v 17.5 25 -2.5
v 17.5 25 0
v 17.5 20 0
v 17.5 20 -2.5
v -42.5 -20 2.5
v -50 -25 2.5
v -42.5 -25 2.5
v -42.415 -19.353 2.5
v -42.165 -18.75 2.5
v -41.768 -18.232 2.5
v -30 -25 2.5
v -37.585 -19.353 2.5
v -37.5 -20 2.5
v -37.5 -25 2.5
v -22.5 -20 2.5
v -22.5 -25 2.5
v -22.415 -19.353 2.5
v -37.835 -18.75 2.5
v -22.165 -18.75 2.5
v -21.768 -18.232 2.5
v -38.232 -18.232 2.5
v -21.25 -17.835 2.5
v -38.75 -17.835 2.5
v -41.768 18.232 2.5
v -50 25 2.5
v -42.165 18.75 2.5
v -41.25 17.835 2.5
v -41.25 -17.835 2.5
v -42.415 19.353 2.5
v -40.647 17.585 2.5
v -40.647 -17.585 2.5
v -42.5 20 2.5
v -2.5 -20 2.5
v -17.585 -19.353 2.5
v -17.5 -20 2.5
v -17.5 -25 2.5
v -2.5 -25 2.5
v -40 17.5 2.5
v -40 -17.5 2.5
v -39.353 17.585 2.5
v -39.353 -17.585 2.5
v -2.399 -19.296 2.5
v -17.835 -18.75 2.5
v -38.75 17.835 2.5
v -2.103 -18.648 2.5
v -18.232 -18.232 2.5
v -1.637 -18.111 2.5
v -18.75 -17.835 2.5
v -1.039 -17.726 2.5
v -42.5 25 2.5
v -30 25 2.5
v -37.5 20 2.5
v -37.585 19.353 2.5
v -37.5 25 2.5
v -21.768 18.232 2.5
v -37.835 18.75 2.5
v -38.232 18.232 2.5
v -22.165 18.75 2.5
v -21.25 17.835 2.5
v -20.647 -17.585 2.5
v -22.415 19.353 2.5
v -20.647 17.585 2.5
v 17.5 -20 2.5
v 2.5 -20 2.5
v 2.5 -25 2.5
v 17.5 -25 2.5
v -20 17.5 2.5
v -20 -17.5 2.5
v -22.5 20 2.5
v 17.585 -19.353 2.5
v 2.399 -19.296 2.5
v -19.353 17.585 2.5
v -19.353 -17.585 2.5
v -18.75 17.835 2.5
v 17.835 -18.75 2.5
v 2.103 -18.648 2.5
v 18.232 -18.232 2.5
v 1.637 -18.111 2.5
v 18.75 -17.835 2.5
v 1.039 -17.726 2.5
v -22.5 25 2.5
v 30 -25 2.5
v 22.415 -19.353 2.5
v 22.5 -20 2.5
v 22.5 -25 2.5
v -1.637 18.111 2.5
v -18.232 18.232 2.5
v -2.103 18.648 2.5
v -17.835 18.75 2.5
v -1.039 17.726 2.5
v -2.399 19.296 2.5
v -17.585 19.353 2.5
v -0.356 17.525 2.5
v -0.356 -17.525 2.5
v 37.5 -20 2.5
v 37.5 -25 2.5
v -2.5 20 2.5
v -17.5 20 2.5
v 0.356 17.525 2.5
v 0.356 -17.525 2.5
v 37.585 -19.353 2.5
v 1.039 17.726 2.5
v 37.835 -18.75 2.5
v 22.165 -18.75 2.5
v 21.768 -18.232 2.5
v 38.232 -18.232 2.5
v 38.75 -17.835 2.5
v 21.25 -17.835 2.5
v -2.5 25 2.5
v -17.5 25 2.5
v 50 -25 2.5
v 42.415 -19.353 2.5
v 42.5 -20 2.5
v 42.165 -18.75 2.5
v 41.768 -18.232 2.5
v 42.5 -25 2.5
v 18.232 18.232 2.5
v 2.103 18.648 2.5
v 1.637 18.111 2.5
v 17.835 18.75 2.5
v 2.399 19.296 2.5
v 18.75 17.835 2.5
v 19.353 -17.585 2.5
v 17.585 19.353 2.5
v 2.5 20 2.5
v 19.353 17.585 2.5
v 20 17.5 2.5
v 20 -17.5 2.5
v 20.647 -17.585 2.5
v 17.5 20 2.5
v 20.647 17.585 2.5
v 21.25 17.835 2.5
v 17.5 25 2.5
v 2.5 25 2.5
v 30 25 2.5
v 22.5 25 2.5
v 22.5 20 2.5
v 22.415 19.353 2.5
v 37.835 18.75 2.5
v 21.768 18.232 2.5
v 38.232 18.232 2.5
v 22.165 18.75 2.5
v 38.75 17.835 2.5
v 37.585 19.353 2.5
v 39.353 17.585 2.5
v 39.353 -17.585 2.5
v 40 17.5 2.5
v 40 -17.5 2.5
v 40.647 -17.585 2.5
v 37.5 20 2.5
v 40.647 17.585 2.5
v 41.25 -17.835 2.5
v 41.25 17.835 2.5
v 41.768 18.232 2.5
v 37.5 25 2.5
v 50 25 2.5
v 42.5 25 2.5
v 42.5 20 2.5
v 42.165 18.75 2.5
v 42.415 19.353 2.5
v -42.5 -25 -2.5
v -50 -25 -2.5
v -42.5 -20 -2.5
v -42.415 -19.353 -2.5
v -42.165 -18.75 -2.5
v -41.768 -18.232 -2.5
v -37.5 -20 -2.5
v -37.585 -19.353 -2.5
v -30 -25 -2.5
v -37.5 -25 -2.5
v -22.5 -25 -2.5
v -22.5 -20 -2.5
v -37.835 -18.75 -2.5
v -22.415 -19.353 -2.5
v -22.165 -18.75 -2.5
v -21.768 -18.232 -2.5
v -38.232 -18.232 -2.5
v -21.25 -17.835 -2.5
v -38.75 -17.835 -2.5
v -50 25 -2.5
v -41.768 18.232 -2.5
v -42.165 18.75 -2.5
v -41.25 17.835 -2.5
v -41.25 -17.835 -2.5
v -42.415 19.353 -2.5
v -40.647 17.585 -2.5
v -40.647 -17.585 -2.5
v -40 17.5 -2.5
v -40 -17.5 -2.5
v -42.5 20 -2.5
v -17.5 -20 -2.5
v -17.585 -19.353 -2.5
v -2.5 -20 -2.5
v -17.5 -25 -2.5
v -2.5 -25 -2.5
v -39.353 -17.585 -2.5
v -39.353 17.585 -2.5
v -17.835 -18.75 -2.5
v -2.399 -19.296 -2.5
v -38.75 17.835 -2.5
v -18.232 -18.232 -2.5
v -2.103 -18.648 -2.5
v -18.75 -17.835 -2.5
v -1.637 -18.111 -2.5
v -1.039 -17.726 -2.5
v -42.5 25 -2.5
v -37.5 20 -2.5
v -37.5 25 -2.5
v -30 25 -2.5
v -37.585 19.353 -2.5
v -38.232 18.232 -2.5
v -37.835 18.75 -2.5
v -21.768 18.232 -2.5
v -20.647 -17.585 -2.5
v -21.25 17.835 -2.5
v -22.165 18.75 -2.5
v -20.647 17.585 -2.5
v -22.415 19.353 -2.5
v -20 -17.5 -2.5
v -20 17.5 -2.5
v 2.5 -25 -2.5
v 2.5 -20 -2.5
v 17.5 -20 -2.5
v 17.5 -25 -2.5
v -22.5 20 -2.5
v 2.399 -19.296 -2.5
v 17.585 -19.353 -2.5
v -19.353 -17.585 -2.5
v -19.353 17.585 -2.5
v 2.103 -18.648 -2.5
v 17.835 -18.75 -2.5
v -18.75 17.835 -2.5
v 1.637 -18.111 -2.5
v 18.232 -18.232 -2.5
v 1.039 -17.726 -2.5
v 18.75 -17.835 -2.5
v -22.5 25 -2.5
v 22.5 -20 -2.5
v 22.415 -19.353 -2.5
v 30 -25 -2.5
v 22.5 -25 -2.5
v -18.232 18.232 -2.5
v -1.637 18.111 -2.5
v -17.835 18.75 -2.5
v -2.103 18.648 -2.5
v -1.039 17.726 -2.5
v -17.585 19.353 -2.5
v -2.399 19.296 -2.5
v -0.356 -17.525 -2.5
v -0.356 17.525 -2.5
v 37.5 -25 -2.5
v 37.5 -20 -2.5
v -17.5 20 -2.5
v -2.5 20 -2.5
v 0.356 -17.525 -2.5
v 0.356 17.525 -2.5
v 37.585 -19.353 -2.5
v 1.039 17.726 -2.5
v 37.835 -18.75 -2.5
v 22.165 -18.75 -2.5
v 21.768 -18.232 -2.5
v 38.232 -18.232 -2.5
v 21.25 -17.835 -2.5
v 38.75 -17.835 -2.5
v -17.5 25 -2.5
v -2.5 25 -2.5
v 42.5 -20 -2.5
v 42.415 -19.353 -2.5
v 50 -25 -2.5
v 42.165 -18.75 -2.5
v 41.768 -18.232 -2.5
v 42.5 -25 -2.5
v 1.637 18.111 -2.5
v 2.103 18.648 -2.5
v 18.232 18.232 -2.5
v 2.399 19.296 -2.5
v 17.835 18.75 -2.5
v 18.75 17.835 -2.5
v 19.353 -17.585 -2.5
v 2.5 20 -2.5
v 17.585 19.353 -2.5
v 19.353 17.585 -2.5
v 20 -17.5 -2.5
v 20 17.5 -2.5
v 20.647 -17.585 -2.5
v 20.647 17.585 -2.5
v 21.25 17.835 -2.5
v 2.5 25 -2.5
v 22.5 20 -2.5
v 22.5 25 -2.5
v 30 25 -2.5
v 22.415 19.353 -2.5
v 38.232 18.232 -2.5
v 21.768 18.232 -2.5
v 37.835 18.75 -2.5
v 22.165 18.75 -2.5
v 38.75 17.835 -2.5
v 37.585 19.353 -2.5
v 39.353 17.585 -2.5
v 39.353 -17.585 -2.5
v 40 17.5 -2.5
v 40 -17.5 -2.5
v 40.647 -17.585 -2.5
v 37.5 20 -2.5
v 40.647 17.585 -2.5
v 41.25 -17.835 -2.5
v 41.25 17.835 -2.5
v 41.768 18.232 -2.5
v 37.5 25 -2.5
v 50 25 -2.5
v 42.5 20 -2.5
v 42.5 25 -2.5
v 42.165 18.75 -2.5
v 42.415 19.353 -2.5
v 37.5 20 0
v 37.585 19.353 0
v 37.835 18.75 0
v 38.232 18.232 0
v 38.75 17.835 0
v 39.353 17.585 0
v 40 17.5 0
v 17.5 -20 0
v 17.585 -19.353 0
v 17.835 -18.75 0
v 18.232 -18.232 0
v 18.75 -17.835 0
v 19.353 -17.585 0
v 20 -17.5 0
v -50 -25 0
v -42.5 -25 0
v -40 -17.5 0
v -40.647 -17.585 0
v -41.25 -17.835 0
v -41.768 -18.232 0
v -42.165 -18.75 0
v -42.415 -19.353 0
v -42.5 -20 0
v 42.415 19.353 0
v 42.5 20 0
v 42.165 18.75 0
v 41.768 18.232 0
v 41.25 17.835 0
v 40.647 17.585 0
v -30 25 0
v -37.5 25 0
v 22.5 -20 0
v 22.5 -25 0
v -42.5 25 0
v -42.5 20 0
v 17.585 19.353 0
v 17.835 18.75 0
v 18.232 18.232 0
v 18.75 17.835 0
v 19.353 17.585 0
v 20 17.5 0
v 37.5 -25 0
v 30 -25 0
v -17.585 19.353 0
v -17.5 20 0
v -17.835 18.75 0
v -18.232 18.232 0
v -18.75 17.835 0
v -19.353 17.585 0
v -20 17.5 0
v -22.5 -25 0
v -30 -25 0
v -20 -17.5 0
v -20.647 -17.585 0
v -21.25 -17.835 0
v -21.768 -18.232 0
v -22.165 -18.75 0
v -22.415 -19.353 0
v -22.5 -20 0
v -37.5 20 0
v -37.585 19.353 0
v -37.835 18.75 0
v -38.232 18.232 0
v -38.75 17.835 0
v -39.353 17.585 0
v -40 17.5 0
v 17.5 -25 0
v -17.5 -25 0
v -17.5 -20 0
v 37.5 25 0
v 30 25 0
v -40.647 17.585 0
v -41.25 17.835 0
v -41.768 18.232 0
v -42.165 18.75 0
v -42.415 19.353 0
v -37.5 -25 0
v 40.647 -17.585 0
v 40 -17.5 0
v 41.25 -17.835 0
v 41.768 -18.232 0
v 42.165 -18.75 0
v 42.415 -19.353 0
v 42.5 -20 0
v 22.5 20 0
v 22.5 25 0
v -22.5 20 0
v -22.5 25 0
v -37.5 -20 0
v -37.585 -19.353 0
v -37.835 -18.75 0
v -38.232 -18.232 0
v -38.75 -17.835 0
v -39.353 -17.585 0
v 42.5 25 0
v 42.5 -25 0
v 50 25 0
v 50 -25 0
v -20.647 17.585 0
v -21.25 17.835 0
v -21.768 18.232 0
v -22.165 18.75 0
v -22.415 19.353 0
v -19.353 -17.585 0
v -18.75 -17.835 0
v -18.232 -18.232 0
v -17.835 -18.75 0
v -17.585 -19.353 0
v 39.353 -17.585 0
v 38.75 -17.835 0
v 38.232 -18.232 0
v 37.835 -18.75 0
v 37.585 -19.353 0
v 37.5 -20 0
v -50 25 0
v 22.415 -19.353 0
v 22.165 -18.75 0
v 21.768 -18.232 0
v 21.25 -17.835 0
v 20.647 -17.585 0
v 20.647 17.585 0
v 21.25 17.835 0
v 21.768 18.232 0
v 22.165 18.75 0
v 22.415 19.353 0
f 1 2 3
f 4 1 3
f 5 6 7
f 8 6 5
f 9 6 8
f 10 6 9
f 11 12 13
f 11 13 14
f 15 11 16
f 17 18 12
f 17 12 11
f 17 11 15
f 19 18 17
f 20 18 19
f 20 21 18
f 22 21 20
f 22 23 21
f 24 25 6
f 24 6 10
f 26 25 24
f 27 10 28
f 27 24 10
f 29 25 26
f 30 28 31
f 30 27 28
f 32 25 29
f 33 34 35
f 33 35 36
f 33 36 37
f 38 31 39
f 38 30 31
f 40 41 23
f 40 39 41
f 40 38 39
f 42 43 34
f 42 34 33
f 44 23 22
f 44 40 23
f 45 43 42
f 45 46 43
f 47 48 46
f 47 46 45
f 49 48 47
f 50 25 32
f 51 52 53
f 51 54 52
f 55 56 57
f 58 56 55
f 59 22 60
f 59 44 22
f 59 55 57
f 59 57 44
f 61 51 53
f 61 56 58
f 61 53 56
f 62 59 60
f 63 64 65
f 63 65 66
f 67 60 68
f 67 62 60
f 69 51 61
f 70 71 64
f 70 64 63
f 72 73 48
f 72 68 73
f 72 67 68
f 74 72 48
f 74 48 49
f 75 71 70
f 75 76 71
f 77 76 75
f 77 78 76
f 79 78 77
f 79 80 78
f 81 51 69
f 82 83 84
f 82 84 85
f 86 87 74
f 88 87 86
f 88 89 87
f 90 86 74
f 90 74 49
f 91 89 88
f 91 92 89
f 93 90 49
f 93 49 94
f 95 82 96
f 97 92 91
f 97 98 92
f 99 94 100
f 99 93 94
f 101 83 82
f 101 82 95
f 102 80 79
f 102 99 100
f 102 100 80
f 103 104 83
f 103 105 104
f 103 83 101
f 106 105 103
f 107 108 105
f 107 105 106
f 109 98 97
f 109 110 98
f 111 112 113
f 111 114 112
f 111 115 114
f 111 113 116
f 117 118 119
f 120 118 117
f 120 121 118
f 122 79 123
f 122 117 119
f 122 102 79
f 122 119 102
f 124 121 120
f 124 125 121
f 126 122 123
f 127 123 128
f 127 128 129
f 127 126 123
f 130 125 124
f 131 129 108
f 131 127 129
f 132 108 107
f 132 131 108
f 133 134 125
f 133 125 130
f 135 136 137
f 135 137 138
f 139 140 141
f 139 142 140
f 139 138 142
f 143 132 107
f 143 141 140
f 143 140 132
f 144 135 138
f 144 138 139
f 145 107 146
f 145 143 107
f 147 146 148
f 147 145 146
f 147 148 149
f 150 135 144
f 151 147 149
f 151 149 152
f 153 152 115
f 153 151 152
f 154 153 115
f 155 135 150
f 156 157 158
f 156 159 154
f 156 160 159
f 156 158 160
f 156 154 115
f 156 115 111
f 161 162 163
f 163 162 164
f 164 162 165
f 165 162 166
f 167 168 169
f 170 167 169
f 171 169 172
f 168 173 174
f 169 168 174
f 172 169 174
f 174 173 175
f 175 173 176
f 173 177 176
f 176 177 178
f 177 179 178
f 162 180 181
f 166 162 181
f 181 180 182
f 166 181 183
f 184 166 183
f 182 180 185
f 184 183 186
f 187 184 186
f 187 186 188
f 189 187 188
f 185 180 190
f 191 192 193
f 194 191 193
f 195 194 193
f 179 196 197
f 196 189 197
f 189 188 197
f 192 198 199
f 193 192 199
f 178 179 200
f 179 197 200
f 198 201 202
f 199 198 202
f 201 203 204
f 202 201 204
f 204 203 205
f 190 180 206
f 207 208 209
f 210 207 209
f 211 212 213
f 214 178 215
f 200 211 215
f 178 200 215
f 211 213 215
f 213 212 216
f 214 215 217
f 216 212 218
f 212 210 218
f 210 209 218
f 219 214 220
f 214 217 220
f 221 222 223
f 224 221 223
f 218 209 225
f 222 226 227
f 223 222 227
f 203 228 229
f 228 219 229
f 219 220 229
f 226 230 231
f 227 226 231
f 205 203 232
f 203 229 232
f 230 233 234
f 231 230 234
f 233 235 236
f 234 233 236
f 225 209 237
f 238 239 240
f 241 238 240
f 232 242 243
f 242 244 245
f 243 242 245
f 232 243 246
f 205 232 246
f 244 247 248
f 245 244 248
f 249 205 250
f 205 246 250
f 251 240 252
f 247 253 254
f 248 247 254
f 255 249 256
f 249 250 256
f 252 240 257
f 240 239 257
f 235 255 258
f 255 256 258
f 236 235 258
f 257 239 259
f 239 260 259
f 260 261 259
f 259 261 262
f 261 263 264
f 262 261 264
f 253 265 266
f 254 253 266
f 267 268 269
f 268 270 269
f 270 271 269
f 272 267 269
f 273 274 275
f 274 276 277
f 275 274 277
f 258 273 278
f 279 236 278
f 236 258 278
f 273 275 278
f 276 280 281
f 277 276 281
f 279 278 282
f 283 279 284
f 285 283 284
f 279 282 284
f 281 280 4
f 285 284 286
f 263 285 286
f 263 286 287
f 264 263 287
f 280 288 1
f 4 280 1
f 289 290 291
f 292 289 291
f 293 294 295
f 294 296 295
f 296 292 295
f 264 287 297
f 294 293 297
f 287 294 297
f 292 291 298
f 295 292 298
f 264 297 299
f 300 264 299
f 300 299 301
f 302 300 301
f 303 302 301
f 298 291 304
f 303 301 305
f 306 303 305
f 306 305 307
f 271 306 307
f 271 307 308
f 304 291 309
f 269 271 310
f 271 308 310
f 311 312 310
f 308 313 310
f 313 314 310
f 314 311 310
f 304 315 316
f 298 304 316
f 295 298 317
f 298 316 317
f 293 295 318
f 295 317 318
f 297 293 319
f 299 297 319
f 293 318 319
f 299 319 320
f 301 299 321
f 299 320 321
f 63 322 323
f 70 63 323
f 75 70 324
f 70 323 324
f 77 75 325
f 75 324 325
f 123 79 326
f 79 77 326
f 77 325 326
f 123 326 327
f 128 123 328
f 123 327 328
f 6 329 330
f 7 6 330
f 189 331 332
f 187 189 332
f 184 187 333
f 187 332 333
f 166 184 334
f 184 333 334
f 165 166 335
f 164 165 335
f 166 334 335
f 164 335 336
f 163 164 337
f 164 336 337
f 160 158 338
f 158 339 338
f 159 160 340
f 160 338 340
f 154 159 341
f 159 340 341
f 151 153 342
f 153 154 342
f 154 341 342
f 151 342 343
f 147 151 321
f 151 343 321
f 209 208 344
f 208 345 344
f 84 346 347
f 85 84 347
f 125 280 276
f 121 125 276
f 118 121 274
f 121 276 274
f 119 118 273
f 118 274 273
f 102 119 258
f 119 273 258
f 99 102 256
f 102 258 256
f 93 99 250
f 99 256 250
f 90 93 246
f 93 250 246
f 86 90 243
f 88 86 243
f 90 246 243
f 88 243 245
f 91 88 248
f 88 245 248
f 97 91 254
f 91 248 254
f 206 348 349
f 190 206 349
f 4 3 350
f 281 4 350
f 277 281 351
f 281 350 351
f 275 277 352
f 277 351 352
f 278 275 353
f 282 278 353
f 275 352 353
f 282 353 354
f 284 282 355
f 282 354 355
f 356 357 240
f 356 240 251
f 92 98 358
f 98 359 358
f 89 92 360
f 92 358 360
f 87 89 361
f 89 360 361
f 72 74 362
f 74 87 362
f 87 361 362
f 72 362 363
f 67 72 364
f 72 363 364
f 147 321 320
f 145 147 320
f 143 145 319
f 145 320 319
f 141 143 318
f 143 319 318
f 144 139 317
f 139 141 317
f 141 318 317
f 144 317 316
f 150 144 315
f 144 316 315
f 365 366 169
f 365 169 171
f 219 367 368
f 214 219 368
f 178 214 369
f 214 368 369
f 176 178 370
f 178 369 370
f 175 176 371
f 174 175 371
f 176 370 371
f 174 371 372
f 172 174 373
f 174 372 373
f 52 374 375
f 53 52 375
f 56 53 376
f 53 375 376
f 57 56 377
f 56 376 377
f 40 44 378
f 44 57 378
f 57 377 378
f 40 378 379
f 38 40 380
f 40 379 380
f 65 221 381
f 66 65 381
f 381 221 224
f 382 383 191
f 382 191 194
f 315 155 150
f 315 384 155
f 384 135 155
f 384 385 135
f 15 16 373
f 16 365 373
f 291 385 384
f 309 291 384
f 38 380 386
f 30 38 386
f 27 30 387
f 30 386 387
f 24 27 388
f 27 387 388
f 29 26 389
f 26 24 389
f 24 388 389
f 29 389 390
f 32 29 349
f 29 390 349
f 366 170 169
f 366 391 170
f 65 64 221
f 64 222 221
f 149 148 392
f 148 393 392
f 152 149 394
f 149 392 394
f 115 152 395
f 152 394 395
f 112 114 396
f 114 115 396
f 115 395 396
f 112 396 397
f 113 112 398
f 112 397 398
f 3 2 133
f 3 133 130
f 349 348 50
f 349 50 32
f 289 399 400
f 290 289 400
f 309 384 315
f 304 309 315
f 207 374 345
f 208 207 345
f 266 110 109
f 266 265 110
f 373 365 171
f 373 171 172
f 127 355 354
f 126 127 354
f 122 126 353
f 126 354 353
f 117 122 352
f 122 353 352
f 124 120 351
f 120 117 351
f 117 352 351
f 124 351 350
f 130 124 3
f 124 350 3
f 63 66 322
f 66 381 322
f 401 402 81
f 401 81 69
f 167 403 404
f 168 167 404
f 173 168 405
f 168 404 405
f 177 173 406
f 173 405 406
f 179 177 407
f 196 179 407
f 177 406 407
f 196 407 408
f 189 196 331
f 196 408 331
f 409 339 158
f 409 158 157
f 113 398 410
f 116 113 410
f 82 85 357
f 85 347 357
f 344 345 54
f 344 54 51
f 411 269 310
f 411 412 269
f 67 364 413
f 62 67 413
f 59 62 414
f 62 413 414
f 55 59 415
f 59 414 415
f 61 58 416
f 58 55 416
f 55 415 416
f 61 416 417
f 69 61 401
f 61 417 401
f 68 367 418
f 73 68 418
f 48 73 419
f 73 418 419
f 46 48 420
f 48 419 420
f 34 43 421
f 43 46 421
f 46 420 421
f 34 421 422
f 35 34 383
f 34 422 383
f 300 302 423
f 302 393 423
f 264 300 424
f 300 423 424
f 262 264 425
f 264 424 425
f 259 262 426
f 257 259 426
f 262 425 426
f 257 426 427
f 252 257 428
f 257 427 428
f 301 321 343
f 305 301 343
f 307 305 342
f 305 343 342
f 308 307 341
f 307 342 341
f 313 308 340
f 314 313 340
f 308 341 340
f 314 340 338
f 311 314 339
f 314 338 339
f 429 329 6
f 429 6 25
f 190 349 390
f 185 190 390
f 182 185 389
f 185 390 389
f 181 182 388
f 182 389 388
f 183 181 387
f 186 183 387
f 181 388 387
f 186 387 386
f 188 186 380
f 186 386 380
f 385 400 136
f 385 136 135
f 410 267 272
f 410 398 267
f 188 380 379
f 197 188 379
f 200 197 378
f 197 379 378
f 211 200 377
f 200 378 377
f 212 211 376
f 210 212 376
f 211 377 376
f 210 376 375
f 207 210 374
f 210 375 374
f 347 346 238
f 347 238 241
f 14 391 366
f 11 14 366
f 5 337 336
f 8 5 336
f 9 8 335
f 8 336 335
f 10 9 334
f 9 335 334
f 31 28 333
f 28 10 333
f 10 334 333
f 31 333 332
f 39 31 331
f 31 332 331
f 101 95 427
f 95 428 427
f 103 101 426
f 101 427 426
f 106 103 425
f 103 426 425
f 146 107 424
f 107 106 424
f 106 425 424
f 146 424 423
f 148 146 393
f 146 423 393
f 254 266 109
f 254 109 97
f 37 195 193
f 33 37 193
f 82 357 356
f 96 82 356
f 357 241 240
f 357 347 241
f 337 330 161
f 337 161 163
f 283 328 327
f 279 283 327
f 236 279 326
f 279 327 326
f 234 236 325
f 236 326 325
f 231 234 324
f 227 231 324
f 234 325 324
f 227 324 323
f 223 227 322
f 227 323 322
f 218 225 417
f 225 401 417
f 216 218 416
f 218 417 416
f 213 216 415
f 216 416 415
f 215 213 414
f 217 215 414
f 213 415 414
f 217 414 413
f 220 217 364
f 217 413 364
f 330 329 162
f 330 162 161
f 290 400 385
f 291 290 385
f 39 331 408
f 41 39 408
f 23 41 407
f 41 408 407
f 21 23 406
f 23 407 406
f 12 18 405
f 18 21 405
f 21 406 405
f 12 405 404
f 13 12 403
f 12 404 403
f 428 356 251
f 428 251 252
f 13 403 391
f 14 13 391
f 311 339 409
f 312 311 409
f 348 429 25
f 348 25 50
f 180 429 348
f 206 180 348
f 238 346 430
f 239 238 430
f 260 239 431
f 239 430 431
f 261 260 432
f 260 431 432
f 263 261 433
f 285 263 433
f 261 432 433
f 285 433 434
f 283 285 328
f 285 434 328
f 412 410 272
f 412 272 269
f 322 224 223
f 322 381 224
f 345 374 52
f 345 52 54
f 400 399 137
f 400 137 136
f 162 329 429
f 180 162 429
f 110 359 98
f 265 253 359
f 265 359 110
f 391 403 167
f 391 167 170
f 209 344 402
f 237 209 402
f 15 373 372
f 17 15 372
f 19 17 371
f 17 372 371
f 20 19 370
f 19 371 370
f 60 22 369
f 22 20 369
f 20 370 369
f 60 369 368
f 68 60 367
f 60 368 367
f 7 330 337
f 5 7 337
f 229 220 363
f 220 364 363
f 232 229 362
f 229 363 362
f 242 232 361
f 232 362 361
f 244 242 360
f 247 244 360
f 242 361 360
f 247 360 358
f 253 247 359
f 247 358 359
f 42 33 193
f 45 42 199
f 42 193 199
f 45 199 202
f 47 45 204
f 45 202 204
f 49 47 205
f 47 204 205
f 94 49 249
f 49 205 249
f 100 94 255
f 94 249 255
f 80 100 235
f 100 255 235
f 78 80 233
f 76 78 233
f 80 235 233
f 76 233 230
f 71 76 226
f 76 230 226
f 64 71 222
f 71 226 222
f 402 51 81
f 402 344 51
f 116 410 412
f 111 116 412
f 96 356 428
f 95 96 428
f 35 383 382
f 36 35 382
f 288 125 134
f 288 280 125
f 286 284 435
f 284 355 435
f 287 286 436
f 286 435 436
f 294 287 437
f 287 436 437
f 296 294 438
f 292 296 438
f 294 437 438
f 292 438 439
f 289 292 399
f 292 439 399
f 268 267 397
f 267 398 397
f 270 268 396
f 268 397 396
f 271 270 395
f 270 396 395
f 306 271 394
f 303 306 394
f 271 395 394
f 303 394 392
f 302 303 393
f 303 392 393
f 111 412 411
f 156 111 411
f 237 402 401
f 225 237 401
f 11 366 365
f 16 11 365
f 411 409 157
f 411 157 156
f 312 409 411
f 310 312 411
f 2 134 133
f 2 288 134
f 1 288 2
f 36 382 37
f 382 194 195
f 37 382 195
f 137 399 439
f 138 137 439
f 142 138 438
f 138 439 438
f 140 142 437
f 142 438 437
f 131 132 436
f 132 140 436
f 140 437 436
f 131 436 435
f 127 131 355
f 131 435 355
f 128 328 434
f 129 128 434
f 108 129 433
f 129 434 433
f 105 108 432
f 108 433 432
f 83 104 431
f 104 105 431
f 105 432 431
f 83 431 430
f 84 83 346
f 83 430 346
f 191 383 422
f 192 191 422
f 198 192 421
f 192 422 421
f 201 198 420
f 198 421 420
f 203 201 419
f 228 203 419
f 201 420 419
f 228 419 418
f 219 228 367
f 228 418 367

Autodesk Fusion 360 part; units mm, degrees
sketch "Sketch1" plane through (0, 0, 0) normal (0, 0, 1) x (1, 0, 0)
  line L0 (-10, 25) -> (-2.5, 25)
  line L1 (-2.5, 25) -> (-2.5, 20)
  arc A0 (-2.5, 20) -> (0, 17.5) centre (0, 20) ccw
  arc A1 (0, 17.5) -> (2.5, 20) centre (0, 20) ccw
  line L2 (2.5, 20) -> (2.5, 25)
  line L3 (2.5, 25) -> (10, 25)
  line L4 (0, 0) -> (0, 20) construction
  line L5 (0, 0) -> (10, 0) construction
  line L6 (-10, -25) -> (-2.5, -25)
  line L7 (-2.5, -25) -> (-2.5, -20)
  arc A2 (0, -17.5) -> (-2.5, -20) centre (0, -20) ccw
  arc A3 (2.5, -20) -> (0, -17.5) centre (0, -20) ccw
  line L8 (2.5, -20) -> (2.5, -25)
  line L9 (2.5, -25) -> (10, -25)
  line L10 (10, -25) -> (10, 25)
  line L11 (-10, -25) -> (-10, 25)
  line L12 (-10, 17.5) -> (10, 17.5) construction
  line L13 (-37.5, 25) -> (-30, 25)
  line L14 (-37.5, 20) -> (-37.5, 25)
  arc A4 (-40, 17.5) -> (-37.5, 20) centre (-40, 20) ccw
  arc A5 (-42.5, 20) -> (-40, 17.5) centre (-40, 20) ccw
  line L15 (-42.5, 25) -> (-42.5, 20)
  line L16 (-50, 25) -> (-42.5, 25)
  line L17 (-50, -25) -> (-50, 25)
  line L18 (-50, -25) -> (-42.5, -25)
  line L19 (-42.5, -25) -> (-42.5, -20)
  arc A6 (-40, -17.5) -> (-42.5, -20) centre (-40, -20) ccw
  arc A7 (-37.5, -20) -> (-40, -17.5) centre (-40, -20) ccw
  line L20 (-37.5, -20) -> (-37.5, -25)
  line L21 (-37.5, -25) -> (-30, -25)
  line L22 (-30, -25) -> (-30, 25)
  line L23 (-17.5, 25) -> (-10, 25)
  line L24 (-17.5, 20) -> (-17.5, 25)
  arc A8 (-20, 17.5) -> (-17.5, 20) centre (-20, 20) ccw
  arc A9 (-22.5, 20) -> (-20, 17.5) centre (-20, 20) ccw
  line L25 (-22.5, 25) -> (-22.5, 20)
  line L26 (-30, 25) -> (-22.5, 25)
  line L27 (-30, -25) -> (-30, 25)
  line L28 (-30, -25) -> (-22.5, -25)
  line L29 (-22.5, -25) -> (-22.5, -20)
  arc A10 (-20, -17.5) -> (-22.5, -20) centre (-20, -20) ccw
  arc A11 (-17.5, -20) -> (-20, -17.5) centre (-20, -20) ccw
  line L30 (-17.5, -20) -> (-17.5, -25)
  line L31 (-17.5, -25) -> (-10, -25)
  line L32 (-10, -25) -> (-10, 25)
  line L33 (22.5, 25) -> (30, 25)
  line L34 (22.5, 20) -> (22.5, 25)
  arc A12 (20, 17.5) -> (22.5, 20) centre (20, 20) ccw
  arc A13 (17.5, 20) -> (20, 17.5) centre (20, 20) ccw
  line L35 (17.5, 25) -> (17.5, 20)
  line L36 (10, 25) -> (17.5, 25)
  line L37 (10, -25) -> (10, 25)
  line L38 (10, -25) -> (17.5, -25)
  line L39 (17.5, -25) -> (17.5, -20)
  arc A14 (20, -17.5) -> (17.5, -20) centre (20, -20) ccw
  arc A15 (22.5, -20) -> (20, -17.5) centre (20, -20) ccw
  line L40 (22.5, -20) -> (22.5, -25)
  line L41 (22.5, -25) -> (30, -25)
  line L42 (30, -25) -> (30, 25)
  line L43 (42.5, 25) -> (50, 25)
  line L44 (42.5, 20) -> (42.5, 25)
  arc A16 (40, 17.5) -> (42.5, 20) centre (40, 20) ccw
  arc A17 (37.5, 20) -> (40, 17.5) centre (40, 20) ccw
  line L45 (37.5, 25) -> (37.5, 20)
  line L46 (30, 25) -> (37.5, 25)
  line L47 (30, -25) -> (30, 25)
  line L48 (30, -25) -> (37.5, -25)
  line L49 (37.5, -25) -> (37.5, -20)
  arc A18 (40, -17.5) -> (37.5, -20) centre (40, -20) ccw
  arc A19 (42.5, -20) -> (40, -17.5) centre (40, -20) ccw
  line L50 (42.5, -20) -> (42.5, -25)
  line L51 (42.5, -25) -> (50, -25)
  line L52 (50, -25) -> (50, 25)
  dimension "Notch_Radius" = 2.5
  dimension "Notch_Height" = 7.5
  dimension "Total_Height" = 50
  dimension "Repeat_Length" = 20
  dimension "Repeat_Spacing" = 20
  dimension "d8" = 0
extrude "Extrude1" add sketch "Sketch1" along normal mid plane 5
equation "Number_Repeat = 5"
equation "Thickness = 0.5 cm"
